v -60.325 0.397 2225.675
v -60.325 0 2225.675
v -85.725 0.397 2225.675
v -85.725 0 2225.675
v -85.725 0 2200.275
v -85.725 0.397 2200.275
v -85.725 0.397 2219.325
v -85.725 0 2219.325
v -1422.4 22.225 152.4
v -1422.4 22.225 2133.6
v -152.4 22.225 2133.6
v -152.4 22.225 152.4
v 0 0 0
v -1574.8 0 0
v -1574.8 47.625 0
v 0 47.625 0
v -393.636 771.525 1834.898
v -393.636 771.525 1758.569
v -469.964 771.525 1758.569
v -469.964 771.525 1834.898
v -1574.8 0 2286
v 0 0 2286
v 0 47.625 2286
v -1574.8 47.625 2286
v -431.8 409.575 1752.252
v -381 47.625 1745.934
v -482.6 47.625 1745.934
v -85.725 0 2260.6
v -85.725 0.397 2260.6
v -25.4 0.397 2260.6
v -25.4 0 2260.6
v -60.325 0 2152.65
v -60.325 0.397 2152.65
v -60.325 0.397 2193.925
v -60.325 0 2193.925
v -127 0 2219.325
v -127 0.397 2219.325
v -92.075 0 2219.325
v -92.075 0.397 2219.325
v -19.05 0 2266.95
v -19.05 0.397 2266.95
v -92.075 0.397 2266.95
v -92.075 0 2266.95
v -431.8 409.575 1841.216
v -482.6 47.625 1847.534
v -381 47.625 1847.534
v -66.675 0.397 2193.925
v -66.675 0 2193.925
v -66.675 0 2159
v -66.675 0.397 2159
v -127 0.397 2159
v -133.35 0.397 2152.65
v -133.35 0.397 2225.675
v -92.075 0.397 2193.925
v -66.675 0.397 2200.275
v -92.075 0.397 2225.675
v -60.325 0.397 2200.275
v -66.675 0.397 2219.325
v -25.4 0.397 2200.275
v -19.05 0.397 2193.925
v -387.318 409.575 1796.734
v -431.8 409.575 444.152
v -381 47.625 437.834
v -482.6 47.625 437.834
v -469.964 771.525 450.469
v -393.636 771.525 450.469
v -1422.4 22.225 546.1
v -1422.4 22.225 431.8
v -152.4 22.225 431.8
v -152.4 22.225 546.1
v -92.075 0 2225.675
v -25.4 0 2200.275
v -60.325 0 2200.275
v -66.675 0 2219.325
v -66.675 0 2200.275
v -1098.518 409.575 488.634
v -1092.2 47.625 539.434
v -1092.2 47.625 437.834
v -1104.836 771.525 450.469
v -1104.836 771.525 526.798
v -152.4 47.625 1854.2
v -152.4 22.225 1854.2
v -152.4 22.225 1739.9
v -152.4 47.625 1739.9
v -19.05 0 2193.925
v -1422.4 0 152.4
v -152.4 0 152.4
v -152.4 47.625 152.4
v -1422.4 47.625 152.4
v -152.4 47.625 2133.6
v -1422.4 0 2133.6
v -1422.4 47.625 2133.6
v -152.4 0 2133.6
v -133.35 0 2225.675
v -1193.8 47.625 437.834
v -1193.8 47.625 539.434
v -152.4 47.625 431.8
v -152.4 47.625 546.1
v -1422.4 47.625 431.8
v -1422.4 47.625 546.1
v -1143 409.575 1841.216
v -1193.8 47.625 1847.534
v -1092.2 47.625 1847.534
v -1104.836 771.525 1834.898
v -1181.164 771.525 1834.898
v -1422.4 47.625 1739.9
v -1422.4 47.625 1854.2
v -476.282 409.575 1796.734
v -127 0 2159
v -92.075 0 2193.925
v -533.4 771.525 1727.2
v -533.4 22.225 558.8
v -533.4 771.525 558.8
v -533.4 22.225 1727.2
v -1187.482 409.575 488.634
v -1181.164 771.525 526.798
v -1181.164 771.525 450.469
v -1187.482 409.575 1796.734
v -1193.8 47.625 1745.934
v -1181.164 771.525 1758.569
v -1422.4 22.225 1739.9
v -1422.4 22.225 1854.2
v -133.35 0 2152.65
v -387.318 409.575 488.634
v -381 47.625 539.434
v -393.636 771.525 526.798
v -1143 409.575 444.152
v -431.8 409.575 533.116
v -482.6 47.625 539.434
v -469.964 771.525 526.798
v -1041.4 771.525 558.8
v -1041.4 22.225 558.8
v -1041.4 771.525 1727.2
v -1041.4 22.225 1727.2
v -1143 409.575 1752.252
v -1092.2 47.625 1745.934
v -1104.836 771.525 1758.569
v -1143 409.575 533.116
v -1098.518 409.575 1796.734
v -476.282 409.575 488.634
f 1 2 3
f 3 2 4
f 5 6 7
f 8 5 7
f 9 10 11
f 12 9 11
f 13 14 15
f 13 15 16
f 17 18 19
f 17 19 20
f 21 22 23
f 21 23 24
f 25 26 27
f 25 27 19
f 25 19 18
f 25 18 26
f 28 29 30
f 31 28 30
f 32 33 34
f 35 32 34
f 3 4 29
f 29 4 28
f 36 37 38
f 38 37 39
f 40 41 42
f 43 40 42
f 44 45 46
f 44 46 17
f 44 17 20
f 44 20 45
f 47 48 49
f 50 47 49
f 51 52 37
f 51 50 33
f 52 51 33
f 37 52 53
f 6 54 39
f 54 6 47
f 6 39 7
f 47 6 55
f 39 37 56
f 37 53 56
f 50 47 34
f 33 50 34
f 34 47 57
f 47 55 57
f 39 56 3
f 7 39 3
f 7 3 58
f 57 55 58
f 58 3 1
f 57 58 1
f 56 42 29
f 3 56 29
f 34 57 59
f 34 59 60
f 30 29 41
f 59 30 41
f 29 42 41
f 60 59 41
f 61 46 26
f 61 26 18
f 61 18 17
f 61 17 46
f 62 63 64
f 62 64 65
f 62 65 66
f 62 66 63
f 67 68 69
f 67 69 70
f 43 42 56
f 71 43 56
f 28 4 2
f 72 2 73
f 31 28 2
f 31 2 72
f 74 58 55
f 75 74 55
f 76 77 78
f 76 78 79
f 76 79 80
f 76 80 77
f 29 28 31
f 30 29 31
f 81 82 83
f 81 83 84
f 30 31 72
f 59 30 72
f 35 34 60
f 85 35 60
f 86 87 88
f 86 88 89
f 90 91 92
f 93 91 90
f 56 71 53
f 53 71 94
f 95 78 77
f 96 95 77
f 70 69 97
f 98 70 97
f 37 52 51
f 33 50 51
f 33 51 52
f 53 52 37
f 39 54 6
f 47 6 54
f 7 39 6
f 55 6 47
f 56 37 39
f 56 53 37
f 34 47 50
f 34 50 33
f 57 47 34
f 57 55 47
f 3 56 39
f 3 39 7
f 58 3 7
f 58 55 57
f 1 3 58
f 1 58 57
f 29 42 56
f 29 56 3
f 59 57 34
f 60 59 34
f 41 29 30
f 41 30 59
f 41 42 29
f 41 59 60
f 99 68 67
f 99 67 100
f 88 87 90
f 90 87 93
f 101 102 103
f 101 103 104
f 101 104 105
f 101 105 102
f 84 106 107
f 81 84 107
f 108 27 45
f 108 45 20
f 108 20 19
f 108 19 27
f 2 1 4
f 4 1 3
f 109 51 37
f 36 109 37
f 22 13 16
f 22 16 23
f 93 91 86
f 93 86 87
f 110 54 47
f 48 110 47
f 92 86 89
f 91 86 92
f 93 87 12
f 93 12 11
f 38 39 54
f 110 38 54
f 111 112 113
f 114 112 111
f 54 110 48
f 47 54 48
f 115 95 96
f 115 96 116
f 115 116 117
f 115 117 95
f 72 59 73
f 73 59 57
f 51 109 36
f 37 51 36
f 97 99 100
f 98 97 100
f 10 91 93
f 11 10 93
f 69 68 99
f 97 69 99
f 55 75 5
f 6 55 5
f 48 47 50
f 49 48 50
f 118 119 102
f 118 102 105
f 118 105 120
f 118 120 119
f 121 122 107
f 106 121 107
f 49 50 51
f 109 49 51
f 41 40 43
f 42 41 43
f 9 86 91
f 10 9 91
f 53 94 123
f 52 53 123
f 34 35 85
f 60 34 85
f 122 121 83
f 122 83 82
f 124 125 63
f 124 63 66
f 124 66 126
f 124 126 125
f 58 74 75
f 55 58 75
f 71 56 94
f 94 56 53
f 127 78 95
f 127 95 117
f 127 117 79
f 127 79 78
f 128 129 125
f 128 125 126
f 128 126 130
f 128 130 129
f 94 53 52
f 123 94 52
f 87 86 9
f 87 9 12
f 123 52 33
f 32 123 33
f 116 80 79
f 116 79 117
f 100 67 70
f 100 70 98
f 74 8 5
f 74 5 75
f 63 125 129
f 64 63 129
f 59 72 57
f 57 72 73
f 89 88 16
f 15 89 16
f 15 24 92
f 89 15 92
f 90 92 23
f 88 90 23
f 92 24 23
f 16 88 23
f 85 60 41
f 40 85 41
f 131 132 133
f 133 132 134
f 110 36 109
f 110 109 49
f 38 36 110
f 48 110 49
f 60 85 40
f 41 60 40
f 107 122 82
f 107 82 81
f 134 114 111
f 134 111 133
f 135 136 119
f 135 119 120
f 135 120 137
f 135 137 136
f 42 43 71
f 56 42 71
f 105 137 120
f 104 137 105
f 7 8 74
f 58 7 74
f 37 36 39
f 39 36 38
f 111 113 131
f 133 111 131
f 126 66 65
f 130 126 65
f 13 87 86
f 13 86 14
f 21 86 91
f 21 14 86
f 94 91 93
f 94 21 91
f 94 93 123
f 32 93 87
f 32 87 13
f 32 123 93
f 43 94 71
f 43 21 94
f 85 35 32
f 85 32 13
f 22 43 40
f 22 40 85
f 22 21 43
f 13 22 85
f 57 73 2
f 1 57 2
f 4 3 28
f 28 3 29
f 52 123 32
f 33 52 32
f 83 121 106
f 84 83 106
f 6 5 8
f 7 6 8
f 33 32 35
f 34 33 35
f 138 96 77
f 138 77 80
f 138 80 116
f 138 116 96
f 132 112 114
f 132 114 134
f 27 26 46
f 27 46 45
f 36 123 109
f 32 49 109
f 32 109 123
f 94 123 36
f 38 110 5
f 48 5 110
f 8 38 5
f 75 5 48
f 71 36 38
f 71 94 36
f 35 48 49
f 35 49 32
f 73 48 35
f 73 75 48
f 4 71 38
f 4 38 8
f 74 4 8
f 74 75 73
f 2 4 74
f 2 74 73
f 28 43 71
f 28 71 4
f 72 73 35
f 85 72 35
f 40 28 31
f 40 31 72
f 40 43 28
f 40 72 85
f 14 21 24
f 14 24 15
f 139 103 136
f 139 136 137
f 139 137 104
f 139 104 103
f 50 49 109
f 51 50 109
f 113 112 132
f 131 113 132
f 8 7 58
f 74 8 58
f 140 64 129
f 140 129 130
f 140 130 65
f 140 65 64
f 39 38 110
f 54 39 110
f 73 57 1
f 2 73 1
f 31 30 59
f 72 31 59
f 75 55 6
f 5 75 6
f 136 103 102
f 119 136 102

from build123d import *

# Parameters (mm, degrees)
F0_W      = 152.4
F0_H      = 1981.2
F1_DEPTH  = 47.625
F0_W_2    = 1270
F2_DEPTH  = 22.225
F3_W      = 25.4
F3_H      = 114.3
F4_DEPTH  = 1270
F5_W      = 101.6
F5_H      = 101.6
F6_DEPTH  = 723.9
F6_TAPER  = 1
F7_W      = 508
F7_H      = 1168.4
F8_DEPTH  = 749.3
F9_W      = 6.35
F9_H      = 6.35
F10_DEPTH = 0.396875
F11_DEPTH = 0.396875


with BuildPart() as f1:
    # F0 (on Front) → F1 (new body)
    with BuildSketch(Plane.XZ):
        Polygon((-152.4, 2133.6), (0, 2133.6), (0, 2286), (-1574.8, 2286), (-1574.8, 2133.6), (-1422.4, 2133.6), align=None)
        with Locations((-1498.6, 1143)):
            Rectangle(F0_W, F0_H)
        with Locations((-76.2, 1143)):
            Rectangle(F0_W, F0_H)
        Polygon((-1574.8, 0), (0, 0), (0, 152.4), (-152.4, 152.4), (-1422.4, 152.4), (-1574.8, 152.4), align=None)
    extrude(amount=-F1_DEPTH)

    # F9 (on face) → F10 (cut)
    with BuildSketch(Plane.XZ):
        Polygon((-60.325, 2200.275), (-60.325, 2193.925), (-19.05, 2193.925), (-19.05, 2266.95), (-92.075, 2266.95), (-92.075, 2225.675), (-85.725, 2225.675), (-85.725, 2260.6), (-25.4, 2260.6), (-25.4, 2200.275), align=None)
        Polygon((-92.075, 2219.325), (-92.075, 2193.925), (-66.675, 2193.925), (-66.675, 2200.275), (-85.725, 2200.275), (-85.725, 2219.325), align=None)
        with Locations((-63.5, 2197.1)):
            Rectangle(F9_W, F9_H)
        Polygon((-66.675, 2219.325), (-66.675, 2200.275), (-60.325, 2200.275), (-60.325, 2225.675), (-85.725, 2225.675), (-85.725, 2219.325), align=None)
        with Locations((-88.9, 2222.5)):
            Rectangle(F9_W, F9_H)
        Polygon((-60.325, 2193.925), (-66.675, 2193.925), (-66.675, 2159), (-127, 2159), (-127, 2219.325), (-92.075, 2219.325), (-92.075, 2225.675), (-133.35, 2225.675), (-133.35, 2152.65), (-60.325, 2152.65), align=None)
    extrude(amount=-F10_DEPTH, mode=Mode.SUBTRACT)


with BuildPart() as f2:
    # F0 (on Front) → F2 (new body)
    with BuildSketch(Plane.XZ):
        with Locations((-787.4, 1143)):
            Rectangle(F0_W_2, F0_H)
    extrude(amount=-F2_DEPTH)


with BuildPart() as f4:
    # F3 (on face) → F4 (new body, through all)
    with BuildSketch(Plane.YZ.offset(-1422.4)):
        with Locations((34.925, 488.95)):
            Rectangle(F3_W, F3_H)
    extrude(amount=F4_DEPTH)


with BuildPart() as f4b:
    # F3 (on face) → F4, piece 2 (new body, through all)
    with BuildSketch(Plane.YZ.offset(-1422.4)):
        with Locations((34.925, 1797.05)):
            Rectangle(F3_W, F3_H)
    extrude(amount=F4_DEPTH)


with BuildPart() as f6:
    # F5 (on face) → F6 (new body)
    with BuildSketch(Plane(origin=(0, 47.625, 0), x_dir=(-1, 0, 0), z_dir=(0, 1, 0))):
        with Locations((431.8, 1796.7336519241)):
            Rectangle(F5_W, F5_H)
    extrude(amount=F6_DEPTH, taper=F6_TAPER)


with BuildPart() as f6b:
    # F5 (on face) → F6, piece 2 (new body)
    with BuildSketch(Plane(origin=(0, 47.625, 0), x_dir=(-1, 0, 0), z_dir=(0, 1, 0))):
        with Locations((1143, 1796.7336519241)):
            Rectangle(F5_W, F5_H)
    extrude(amount=F6_DEPTH, taper=F6_TAPER)


with BuildPart() as f6c:
    # F5 (on face) → F6, piece 3 (new body)
    with BuildSketch(Plane(origin=(0, 47.625, 0), x_dir=(-1, 0, 0), z_dir=(0, 1, 0))):
        with Locations((431.8, 488.6336519241)):
            Rectangle(F5_W, F5_H)
    extrude(amount=F6_DEPTH, taper=F6_TAPER)


with BuildPart() as f6d:
    # F5 (on face) → F6, piece 4 (new body)
    with BuildSketch(Plane(origin=(0, 47.625, 0), x_dir=(-1, 0, 0), z_dir=(0, 1, 0))):
        with Locations((1143, 488.6336519241)):
            Rectangle(F5_W, F5_H)
    extrude(amount=F6_DEPTH, taper=F6_TAPER)


with BuildPart() as f8:
    # F7 (on face) → F8 (new body, through all)
    with BuildSketch(Plane(origin=(0, 22.225, 0), x_dir=(-1, 0, 0), z_dir=(0, 1, 0))):
        with Locations((787.4, 1143)):
            Rectangle(F7_W, F7_H)
    extrude(amount=F8_DEPTH)


with BuildPart() as f11:
    # F11 (new, through all): a face of the model
    f11_faces = [f1.part.faces().sort_by_distance(p)[0] for p in [
        (-90.4585538982, 0.396875, 2246.3125),
    ]]
    extrude(f11_faces, amount=F11_DEPTH)


solid = Compound([f1.part, f2.part, f4.part, f4b.part, f6.part, f6b.part, f6c.part, f6d.part, f8.part, f11.part])
